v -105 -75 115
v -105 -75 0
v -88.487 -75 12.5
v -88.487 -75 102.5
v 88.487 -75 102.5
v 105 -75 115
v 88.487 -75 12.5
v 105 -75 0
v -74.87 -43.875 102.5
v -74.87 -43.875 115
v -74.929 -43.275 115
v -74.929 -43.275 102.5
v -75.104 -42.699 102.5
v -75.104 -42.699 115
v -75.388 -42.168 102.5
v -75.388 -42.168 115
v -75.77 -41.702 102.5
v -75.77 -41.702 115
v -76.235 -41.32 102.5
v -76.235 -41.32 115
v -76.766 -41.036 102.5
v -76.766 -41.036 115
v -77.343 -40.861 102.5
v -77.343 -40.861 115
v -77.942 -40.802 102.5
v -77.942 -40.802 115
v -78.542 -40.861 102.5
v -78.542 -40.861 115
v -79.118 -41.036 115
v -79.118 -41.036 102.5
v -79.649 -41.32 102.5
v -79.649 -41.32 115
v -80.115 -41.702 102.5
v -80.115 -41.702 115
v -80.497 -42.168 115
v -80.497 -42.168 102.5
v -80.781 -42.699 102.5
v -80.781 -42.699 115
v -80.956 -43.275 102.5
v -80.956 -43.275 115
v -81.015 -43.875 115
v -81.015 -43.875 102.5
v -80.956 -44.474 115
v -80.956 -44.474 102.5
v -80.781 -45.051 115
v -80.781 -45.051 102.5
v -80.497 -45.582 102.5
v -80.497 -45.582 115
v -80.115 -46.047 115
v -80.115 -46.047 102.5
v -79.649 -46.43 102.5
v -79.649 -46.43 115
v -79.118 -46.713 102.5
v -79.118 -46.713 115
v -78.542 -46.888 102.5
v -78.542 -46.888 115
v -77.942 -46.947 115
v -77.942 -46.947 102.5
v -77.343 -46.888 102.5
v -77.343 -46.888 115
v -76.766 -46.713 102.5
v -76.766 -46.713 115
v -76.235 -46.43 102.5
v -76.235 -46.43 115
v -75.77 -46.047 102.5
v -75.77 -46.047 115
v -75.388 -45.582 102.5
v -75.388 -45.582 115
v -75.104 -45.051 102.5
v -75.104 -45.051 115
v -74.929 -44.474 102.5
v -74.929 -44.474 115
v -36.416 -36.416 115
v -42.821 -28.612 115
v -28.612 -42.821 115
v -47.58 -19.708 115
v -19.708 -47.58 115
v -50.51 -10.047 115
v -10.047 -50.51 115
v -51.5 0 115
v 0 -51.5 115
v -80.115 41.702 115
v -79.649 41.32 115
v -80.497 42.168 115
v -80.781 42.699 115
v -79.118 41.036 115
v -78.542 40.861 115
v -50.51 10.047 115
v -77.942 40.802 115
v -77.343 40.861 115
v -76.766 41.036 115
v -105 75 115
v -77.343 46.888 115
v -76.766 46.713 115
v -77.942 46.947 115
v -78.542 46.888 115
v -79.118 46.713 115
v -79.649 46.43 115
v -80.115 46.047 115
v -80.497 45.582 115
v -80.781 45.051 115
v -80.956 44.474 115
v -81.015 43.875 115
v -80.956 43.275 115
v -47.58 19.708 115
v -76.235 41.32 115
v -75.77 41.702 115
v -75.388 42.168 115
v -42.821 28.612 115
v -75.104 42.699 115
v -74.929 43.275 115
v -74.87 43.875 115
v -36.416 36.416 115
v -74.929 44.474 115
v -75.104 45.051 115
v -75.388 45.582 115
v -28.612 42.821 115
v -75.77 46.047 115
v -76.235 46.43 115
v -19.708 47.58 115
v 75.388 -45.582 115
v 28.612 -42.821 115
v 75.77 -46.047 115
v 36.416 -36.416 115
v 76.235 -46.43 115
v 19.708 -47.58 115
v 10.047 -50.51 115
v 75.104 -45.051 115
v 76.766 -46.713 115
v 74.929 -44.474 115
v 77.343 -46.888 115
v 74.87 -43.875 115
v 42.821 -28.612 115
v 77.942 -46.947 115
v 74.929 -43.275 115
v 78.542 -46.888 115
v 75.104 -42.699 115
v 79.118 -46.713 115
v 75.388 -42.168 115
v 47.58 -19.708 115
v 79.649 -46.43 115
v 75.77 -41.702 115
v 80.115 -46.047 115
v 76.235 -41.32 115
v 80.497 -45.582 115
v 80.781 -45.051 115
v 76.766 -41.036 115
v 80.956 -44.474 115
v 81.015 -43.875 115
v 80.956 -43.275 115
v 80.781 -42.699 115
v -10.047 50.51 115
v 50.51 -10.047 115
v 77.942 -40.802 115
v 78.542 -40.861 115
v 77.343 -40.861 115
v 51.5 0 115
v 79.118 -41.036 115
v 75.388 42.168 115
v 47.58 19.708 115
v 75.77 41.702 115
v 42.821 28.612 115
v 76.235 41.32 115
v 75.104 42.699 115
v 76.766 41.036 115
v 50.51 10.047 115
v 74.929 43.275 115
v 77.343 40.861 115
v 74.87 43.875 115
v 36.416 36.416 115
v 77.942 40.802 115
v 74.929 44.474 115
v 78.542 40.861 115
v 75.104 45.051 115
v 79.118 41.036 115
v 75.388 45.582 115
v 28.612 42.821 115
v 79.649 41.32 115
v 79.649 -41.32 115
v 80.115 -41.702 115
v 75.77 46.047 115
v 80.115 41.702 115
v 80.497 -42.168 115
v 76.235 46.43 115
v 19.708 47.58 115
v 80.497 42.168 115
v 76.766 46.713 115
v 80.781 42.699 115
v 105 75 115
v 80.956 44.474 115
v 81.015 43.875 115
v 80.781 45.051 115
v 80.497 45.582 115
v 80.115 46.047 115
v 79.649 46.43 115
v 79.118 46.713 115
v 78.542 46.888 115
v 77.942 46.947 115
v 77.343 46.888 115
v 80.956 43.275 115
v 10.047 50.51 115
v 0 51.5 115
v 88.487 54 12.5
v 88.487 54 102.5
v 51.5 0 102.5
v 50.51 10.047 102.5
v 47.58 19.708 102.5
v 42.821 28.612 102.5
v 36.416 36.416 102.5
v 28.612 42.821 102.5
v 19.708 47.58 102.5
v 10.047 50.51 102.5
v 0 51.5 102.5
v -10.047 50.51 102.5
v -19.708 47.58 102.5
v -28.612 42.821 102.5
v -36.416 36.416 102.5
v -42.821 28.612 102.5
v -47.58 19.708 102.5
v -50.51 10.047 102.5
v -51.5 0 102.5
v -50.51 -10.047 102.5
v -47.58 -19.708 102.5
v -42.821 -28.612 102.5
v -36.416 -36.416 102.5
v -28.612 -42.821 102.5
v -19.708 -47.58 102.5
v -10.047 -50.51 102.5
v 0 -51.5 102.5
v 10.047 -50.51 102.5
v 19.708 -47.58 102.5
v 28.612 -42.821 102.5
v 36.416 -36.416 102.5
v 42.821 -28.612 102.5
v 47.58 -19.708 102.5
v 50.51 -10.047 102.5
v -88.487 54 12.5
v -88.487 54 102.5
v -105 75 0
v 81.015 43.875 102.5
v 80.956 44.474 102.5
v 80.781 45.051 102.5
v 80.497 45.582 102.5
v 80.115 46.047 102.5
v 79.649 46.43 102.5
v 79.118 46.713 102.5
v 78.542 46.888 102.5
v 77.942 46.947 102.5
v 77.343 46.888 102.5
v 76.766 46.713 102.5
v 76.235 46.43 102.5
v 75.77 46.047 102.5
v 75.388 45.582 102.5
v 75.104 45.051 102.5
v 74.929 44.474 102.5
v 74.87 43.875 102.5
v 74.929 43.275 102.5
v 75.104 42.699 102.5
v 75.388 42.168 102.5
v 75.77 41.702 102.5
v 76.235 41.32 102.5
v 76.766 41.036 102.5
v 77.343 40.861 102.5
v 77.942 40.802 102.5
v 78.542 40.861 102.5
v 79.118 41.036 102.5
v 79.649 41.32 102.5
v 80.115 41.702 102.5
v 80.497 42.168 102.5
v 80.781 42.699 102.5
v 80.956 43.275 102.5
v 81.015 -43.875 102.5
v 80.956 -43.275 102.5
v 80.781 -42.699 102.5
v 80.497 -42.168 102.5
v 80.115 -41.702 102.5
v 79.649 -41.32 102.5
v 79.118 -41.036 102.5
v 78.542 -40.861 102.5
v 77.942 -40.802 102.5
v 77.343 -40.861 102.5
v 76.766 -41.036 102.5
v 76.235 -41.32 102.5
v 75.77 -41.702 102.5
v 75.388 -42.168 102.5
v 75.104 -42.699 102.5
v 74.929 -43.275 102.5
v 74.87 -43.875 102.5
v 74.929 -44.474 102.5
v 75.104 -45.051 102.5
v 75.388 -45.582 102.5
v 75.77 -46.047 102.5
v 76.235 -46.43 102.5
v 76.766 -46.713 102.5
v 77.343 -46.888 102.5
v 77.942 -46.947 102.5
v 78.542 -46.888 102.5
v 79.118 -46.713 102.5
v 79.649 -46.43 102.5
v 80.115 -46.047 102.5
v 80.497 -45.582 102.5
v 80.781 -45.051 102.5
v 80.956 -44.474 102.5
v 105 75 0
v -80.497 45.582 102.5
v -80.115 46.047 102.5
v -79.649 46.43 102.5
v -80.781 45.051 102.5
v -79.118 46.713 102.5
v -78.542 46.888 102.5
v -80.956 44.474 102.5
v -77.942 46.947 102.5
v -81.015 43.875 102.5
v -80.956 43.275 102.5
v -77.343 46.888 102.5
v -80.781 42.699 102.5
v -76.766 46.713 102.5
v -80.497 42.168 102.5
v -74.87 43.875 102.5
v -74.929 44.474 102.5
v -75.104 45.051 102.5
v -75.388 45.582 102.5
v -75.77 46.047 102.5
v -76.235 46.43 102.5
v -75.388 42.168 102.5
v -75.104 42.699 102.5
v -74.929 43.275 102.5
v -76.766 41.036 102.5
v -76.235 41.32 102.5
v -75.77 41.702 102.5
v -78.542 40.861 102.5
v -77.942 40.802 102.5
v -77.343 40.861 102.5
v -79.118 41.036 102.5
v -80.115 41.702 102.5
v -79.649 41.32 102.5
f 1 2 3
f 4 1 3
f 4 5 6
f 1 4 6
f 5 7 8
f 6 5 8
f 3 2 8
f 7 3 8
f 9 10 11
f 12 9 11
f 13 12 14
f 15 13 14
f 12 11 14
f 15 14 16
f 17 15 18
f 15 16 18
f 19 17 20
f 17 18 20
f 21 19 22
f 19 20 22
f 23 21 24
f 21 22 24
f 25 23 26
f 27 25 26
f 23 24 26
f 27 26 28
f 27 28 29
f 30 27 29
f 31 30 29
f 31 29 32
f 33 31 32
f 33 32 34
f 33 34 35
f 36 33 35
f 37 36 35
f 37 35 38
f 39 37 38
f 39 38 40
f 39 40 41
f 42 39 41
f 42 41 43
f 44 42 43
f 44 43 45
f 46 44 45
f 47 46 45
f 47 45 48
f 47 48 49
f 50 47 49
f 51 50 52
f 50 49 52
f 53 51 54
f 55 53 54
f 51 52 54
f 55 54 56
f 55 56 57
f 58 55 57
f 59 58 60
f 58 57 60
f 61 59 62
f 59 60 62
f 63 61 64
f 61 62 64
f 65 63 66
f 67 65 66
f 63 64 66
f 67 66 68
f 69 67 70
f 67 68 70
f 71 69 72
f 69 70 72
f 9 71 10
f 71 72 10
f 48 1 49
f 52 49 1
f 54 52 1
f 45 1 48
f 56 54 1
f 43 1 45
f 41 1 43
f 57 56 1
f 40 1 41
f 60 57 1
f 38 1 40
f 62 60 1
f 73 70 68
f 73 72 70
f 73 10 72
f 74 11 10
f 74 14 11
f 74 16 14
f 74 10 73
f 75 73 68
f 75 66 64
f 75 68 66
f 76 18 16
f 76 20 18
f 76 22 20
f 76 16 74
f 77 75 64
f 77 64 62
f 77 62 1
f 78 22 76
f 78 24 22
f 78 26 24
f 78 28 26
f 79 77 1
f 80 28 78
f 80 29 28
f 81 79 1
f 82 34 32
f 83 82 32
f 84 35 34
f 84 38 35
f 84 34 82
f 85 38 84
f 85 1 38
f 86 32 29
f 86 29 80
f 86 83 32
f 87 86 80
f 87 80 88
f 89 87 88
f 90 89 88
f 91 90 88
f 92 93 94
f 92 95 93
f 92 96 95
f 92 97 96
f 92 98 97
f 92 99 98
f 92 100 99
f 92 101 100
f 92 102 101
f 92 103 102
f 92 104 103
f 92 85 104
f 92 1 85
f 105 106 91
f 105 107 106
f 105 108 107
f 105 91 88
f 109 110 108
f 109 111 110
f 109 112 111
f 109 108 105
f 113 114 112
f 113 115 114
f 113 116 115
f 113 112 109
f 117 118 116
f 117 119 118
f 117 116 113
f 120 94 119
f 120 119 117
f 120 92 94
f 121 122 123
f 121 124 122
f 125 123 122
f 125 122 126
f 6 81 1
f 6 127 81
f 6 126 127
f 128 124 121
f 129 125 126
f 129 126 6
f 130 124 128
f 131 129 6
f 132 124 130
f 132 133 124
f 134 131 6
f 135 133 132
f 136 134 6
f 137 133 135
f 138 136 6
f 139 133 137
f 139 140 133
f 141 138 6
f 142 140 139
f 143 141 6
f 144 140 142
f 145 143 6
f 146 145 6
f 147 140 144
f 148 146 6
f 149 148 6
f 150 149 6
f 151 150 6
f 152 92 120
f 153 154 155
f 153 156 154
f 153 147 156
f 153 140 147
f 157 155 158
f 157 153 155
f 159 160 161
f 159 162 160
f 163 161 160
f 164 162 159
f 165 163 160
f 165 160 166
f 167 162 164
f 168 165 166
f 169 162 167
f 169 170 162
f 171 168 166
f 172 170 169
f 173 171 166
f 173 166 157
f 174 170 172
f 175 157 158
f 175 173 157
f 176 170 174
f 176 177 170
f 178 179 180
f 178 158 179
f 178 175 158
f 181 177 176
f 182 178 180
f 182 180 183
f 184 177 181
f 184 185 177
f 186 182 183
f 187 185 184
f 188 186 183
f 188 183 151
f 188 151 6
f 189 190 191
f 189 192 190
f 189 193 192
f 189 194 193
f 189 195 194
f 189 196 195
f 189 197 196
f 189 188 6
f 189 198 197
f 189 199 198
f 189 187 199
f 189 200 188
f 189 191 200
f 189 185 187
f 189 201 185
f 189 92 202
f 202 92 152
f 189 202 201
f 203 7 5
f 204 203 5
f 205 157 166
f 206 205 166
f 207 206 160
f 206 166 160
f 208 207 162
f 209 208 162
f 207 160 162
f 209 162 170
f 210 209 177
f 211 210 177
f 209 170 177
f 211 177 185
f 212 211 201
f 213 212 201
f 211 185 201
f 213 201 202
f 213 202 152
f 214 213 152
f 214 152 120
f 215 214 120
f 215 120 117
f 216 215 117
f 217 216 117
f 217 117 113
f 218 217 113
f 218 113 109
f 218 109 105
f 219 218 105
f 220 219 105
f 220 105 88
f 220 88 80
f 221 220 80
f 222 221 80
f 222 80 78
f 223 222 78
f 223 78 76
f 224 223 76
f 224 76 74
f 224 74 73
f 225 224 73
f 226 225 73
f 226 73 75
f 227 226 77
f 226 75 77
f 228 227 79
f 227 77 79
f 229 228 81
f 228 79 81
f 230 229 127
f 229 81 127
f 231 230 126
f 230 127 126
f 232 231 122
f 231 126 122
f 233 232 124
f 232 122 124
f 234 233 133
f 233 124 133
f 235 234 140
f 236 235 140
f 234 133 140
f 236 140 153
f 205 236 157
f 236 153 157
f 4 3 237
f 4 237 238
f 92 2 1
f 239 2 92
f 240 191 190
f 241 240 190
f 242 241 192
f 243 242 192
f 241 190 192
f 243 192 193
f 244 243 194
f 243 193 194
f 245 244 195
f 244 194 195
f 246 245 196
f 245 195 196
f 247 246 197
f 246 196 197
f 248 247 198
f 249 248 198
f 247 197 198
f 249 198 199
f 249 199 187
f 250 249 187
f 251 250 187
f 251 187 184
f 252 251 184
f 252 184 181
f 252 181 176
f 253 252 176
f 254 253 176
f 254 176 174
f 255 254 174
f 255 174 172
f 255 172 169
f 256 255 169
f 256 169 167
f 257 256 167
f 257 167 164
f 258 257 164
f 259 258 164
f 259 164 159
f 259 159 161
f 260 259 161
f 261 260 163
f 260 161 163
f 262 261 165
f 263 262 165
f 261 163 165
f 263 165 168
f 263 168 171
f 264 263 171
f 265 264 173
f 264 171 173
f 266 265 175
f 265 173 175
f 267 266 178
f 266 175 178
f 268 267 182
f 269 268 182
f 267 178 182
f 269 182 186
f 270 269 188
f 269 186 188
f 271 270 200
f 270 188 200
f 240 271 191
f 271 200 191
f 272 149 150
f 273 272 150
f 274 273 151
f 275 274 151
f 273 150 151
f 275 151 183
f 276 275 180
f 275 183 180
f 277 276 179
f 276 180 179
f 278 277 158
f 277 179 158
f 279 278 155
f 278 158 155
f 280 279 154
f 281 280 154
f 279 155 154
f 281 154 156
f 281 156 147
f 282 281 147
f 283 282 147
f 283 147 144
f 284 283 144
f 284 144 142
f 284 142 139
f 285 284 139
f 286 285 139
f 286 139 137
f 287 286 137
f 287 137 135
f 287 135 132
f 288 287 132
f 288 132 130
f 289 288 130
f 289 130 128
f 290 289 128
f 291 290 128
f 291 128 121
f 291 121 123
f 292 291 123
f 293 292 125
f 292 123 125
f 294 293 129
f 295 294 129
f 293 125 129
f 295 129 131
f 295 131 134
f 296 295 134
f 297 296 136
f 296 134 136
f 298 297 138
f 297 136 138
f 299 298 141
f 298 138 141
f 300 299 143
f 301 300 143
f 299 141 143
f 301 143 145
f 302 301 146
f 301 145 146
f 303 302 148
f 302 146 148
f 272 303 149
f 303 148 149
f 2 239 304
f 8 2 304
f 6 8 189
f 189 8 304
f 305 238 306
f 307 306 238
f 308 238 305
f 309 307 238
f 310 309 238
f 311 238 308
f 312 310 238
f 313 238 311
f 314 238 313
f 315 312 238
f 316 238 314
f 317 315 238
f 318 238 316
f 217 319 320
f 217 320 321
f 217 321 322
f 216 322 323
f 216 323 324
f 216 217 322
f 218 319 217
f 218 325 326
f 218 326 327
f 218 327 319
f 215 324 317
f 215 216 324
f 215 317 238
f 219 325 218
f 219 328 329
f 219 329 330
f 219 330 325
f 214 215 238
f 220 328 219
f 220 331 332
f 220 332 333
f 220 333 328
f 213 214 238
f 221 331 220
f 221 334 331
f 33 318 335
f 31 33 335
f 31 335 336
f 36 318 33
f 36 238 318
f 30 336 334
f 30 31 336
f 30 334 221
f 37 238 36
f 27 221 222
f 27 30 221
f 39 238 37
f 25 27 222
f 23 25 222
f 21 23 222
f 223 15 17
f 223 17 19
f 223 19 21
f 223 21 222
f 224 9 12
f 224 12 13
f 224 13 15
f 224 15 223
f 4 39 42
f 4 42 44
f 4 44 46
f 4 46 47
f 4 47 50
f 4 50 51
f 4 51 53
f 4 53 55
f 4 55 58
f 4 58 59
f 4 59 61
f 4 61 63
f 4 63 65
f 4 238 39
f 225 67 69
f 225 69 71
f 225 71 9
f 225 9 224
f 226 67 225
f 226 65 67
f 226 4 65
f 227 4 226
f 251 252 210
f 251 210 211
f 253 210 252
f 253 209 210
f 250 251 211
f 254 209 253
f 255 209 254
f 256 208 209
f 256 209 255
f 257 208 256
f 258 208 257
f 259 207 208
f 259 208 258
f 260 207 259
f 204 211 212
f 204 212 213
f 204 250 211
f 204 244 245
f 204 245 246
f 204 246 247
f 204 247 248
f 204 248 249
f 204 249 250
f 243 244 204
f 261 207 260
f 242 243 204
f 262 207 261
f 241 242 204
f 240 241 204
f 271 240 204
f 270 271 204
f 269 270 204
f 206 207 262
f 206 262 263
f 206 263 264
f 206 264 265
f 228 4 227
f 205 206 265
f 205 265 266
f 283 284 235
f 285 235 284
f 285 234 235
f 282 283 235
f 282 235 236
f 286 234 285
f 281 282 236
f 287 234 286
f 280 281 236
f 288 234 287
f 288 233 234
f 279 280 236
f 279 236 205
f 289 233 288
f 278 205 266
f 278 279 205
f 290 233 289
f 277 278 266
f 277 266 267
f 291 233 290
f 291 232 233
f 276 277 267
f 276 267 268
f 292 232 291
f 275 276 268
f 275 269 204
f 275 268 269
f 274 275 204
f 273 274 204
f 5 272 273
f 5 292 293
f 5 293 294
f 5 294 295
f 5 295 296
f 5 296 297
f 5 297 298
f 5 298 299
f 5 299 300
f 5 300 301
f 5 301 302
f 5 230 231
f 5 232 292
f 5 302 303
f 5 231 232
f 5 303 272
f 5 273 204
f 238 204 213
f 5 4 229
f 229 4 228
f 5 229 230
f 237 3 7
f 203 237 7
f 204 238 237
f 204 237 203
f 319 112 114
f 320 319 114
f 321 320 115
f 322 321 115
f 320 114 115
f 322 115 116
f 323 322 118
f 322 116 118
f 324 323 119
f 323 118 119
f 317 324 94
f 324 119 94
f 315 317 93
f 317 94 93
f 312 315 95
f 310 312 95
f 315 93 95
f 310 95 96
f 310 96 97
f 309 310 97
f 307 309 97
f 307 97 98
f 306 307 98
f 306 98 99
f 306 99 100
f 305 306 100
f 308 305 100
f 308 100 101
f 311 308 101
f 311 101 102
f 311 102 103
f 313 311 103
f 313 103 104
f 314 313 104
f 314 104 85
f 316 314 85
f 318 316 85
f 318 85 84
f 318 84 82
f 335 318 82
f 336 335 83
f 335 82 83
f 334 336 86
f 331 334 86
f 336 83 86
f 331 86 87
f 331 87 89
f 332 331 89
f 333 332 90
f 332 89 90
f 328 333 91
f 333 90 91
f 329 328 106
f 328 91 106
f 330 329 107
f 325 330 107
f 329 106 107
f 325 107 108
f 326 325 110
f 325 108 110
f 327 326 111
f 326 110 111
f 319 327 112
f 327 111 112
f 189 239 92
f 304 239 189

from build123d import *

# Parameters (mm, degrees)
SKETCH1_W           = 210
SKETCH1_H           = 150
BOSS_EXTRUDE1_DEPTH = 115
SKETCH3_W           = 176.973663014
SKETCH3_H           = 90
CUT_EXTRUDE1_DEPTH  = 129
CUT_EXTRUDE2_REACH  = 174.844
SKETCH4_R           = 3.0725
CUT_EXTRUDE3_REACH  = 174.844
SKETCH5_R           = 51.5


with BuildPart() as part:
    # Sketch1 → Boss-Extrude1 (new body)
    with BuildSketch(Plane.XY):
        Rectangle(SKETCH1_W, SKETCH1_H)
    extrude(amount=BOSS_EXTRUDE1_DEPTH)

    # Sketch3 → Cut-Extrude1 (cut)
    with BuildSketch(Plane.XZ.offset(75)):
        with Locations((0, 57.5)):
            Rectangle(SKETCH3_W, SKETCH3_H)
    extrude(amount=-CUT_EXTRUDE1_DEPTH, mode=Mode.SUBTRACT)

    # Sketch4 → Cut-Extrude2 (cut, up to next)
    with BuildSketch(Plane.XY.offset(115), mode=Mode.PRIVATE) as cut_extrude2_sk1:
        with Locations((77.942286341, 43.874821937)):
            Circle(SKETCH4_R)
    cut_extrude2_tool1 = extrude(cut_extrude2_sk1.sketch, amount=-CUT_EXTRUDE2_REACH, mode=Mode.PRIVATE) & part.part
    # Sketch4 → Cut-Extrude2 (cut, up to next)
    with BuildSketch(Plane.XY.offset(115), mode=Mode.PRIVATE) as cut_extrude2_sk2:
        with Locations((-77.942286341, 43.874821937)):
            Circle(SKETCH4_R)
    cut_extrude2_tool2 = extrude(cut_extrude2_sk2.sketch, amount=-CUT_EXTRUDE2_REACH, mode=Mode.PRIVATE) & part.part
    # Sketch4 → Cut-Extrude2 (cut, up to next)
    with BuildSketch(Plane.XY.offset(115), mode=Mode.PRIVATE) as cut_extrude2_sk3:
        with Locations((-77.942286341, -43.874821937)):
            Circle(SKETCH4_R)
    cut_extrude2_tool3 = extrude(cut_extrude2_sk3.sketch, amount=-CUT_EXTRUDE2_REACH, mode=Mode.PRIVATE) & part.part
    # Sketch4 → Cut-Extrude2 (cut, up to next)
    with BuildSketch(Plane.XY.offset(115), mode=Mode.PRIVATE) as cut_extrude2_sk4:
        with Locations((77.942286341, -43.874821937)):
            Circle(SKETCH4_R)
    cut_extrude2_tool4 = extrude(cut_extrude2_sk4.sketch, amount=-CUT_EXTRUDE2_REACH, mode=Mode.PRIVATE) & part.part
    add(cut_extrude2_tool1.solids().sort_by_distance((77.942286, 43.874822, 115))[0], mode=Mode.SUBTRACT)
    add(cut_extrude2_tool2.solids().sort_by_distance((-77.942286, 43.874822, 115))[0], mode=Mode.SUBTRACT)
    add(cut_extrude2_tool3.solids().sort_by_distance((-77.942286, -43.874822, 115))[0], mode=Mode.SUBTRACT)
    add(cut_extrude2_tool4.solids().sort_by_distance((77.942286, -43.874822, 115))[0], mode=Mode.SUBTRACT)

    # Sketch5 → Cut-Extrude3 (cut, up to next)
    with BuildSketch(Plane.XY.offset(115), mode=Mode.PRIVATE) as cut_extrude3_sk1:
        Circle(SKETCH5_R)
    cut_extrude3_tool1 = extrude(cut_extrude3_sk1.sketch, amount=-CUT_EXTRUDE3_REACH, mode=Mode.PRIVATE) & part.part
    add(cut_extrude3_tool1.solids().sort_by_distance((0, 0, 115))[0], mode=Mode.SUBTRACT)


solid = part.part
